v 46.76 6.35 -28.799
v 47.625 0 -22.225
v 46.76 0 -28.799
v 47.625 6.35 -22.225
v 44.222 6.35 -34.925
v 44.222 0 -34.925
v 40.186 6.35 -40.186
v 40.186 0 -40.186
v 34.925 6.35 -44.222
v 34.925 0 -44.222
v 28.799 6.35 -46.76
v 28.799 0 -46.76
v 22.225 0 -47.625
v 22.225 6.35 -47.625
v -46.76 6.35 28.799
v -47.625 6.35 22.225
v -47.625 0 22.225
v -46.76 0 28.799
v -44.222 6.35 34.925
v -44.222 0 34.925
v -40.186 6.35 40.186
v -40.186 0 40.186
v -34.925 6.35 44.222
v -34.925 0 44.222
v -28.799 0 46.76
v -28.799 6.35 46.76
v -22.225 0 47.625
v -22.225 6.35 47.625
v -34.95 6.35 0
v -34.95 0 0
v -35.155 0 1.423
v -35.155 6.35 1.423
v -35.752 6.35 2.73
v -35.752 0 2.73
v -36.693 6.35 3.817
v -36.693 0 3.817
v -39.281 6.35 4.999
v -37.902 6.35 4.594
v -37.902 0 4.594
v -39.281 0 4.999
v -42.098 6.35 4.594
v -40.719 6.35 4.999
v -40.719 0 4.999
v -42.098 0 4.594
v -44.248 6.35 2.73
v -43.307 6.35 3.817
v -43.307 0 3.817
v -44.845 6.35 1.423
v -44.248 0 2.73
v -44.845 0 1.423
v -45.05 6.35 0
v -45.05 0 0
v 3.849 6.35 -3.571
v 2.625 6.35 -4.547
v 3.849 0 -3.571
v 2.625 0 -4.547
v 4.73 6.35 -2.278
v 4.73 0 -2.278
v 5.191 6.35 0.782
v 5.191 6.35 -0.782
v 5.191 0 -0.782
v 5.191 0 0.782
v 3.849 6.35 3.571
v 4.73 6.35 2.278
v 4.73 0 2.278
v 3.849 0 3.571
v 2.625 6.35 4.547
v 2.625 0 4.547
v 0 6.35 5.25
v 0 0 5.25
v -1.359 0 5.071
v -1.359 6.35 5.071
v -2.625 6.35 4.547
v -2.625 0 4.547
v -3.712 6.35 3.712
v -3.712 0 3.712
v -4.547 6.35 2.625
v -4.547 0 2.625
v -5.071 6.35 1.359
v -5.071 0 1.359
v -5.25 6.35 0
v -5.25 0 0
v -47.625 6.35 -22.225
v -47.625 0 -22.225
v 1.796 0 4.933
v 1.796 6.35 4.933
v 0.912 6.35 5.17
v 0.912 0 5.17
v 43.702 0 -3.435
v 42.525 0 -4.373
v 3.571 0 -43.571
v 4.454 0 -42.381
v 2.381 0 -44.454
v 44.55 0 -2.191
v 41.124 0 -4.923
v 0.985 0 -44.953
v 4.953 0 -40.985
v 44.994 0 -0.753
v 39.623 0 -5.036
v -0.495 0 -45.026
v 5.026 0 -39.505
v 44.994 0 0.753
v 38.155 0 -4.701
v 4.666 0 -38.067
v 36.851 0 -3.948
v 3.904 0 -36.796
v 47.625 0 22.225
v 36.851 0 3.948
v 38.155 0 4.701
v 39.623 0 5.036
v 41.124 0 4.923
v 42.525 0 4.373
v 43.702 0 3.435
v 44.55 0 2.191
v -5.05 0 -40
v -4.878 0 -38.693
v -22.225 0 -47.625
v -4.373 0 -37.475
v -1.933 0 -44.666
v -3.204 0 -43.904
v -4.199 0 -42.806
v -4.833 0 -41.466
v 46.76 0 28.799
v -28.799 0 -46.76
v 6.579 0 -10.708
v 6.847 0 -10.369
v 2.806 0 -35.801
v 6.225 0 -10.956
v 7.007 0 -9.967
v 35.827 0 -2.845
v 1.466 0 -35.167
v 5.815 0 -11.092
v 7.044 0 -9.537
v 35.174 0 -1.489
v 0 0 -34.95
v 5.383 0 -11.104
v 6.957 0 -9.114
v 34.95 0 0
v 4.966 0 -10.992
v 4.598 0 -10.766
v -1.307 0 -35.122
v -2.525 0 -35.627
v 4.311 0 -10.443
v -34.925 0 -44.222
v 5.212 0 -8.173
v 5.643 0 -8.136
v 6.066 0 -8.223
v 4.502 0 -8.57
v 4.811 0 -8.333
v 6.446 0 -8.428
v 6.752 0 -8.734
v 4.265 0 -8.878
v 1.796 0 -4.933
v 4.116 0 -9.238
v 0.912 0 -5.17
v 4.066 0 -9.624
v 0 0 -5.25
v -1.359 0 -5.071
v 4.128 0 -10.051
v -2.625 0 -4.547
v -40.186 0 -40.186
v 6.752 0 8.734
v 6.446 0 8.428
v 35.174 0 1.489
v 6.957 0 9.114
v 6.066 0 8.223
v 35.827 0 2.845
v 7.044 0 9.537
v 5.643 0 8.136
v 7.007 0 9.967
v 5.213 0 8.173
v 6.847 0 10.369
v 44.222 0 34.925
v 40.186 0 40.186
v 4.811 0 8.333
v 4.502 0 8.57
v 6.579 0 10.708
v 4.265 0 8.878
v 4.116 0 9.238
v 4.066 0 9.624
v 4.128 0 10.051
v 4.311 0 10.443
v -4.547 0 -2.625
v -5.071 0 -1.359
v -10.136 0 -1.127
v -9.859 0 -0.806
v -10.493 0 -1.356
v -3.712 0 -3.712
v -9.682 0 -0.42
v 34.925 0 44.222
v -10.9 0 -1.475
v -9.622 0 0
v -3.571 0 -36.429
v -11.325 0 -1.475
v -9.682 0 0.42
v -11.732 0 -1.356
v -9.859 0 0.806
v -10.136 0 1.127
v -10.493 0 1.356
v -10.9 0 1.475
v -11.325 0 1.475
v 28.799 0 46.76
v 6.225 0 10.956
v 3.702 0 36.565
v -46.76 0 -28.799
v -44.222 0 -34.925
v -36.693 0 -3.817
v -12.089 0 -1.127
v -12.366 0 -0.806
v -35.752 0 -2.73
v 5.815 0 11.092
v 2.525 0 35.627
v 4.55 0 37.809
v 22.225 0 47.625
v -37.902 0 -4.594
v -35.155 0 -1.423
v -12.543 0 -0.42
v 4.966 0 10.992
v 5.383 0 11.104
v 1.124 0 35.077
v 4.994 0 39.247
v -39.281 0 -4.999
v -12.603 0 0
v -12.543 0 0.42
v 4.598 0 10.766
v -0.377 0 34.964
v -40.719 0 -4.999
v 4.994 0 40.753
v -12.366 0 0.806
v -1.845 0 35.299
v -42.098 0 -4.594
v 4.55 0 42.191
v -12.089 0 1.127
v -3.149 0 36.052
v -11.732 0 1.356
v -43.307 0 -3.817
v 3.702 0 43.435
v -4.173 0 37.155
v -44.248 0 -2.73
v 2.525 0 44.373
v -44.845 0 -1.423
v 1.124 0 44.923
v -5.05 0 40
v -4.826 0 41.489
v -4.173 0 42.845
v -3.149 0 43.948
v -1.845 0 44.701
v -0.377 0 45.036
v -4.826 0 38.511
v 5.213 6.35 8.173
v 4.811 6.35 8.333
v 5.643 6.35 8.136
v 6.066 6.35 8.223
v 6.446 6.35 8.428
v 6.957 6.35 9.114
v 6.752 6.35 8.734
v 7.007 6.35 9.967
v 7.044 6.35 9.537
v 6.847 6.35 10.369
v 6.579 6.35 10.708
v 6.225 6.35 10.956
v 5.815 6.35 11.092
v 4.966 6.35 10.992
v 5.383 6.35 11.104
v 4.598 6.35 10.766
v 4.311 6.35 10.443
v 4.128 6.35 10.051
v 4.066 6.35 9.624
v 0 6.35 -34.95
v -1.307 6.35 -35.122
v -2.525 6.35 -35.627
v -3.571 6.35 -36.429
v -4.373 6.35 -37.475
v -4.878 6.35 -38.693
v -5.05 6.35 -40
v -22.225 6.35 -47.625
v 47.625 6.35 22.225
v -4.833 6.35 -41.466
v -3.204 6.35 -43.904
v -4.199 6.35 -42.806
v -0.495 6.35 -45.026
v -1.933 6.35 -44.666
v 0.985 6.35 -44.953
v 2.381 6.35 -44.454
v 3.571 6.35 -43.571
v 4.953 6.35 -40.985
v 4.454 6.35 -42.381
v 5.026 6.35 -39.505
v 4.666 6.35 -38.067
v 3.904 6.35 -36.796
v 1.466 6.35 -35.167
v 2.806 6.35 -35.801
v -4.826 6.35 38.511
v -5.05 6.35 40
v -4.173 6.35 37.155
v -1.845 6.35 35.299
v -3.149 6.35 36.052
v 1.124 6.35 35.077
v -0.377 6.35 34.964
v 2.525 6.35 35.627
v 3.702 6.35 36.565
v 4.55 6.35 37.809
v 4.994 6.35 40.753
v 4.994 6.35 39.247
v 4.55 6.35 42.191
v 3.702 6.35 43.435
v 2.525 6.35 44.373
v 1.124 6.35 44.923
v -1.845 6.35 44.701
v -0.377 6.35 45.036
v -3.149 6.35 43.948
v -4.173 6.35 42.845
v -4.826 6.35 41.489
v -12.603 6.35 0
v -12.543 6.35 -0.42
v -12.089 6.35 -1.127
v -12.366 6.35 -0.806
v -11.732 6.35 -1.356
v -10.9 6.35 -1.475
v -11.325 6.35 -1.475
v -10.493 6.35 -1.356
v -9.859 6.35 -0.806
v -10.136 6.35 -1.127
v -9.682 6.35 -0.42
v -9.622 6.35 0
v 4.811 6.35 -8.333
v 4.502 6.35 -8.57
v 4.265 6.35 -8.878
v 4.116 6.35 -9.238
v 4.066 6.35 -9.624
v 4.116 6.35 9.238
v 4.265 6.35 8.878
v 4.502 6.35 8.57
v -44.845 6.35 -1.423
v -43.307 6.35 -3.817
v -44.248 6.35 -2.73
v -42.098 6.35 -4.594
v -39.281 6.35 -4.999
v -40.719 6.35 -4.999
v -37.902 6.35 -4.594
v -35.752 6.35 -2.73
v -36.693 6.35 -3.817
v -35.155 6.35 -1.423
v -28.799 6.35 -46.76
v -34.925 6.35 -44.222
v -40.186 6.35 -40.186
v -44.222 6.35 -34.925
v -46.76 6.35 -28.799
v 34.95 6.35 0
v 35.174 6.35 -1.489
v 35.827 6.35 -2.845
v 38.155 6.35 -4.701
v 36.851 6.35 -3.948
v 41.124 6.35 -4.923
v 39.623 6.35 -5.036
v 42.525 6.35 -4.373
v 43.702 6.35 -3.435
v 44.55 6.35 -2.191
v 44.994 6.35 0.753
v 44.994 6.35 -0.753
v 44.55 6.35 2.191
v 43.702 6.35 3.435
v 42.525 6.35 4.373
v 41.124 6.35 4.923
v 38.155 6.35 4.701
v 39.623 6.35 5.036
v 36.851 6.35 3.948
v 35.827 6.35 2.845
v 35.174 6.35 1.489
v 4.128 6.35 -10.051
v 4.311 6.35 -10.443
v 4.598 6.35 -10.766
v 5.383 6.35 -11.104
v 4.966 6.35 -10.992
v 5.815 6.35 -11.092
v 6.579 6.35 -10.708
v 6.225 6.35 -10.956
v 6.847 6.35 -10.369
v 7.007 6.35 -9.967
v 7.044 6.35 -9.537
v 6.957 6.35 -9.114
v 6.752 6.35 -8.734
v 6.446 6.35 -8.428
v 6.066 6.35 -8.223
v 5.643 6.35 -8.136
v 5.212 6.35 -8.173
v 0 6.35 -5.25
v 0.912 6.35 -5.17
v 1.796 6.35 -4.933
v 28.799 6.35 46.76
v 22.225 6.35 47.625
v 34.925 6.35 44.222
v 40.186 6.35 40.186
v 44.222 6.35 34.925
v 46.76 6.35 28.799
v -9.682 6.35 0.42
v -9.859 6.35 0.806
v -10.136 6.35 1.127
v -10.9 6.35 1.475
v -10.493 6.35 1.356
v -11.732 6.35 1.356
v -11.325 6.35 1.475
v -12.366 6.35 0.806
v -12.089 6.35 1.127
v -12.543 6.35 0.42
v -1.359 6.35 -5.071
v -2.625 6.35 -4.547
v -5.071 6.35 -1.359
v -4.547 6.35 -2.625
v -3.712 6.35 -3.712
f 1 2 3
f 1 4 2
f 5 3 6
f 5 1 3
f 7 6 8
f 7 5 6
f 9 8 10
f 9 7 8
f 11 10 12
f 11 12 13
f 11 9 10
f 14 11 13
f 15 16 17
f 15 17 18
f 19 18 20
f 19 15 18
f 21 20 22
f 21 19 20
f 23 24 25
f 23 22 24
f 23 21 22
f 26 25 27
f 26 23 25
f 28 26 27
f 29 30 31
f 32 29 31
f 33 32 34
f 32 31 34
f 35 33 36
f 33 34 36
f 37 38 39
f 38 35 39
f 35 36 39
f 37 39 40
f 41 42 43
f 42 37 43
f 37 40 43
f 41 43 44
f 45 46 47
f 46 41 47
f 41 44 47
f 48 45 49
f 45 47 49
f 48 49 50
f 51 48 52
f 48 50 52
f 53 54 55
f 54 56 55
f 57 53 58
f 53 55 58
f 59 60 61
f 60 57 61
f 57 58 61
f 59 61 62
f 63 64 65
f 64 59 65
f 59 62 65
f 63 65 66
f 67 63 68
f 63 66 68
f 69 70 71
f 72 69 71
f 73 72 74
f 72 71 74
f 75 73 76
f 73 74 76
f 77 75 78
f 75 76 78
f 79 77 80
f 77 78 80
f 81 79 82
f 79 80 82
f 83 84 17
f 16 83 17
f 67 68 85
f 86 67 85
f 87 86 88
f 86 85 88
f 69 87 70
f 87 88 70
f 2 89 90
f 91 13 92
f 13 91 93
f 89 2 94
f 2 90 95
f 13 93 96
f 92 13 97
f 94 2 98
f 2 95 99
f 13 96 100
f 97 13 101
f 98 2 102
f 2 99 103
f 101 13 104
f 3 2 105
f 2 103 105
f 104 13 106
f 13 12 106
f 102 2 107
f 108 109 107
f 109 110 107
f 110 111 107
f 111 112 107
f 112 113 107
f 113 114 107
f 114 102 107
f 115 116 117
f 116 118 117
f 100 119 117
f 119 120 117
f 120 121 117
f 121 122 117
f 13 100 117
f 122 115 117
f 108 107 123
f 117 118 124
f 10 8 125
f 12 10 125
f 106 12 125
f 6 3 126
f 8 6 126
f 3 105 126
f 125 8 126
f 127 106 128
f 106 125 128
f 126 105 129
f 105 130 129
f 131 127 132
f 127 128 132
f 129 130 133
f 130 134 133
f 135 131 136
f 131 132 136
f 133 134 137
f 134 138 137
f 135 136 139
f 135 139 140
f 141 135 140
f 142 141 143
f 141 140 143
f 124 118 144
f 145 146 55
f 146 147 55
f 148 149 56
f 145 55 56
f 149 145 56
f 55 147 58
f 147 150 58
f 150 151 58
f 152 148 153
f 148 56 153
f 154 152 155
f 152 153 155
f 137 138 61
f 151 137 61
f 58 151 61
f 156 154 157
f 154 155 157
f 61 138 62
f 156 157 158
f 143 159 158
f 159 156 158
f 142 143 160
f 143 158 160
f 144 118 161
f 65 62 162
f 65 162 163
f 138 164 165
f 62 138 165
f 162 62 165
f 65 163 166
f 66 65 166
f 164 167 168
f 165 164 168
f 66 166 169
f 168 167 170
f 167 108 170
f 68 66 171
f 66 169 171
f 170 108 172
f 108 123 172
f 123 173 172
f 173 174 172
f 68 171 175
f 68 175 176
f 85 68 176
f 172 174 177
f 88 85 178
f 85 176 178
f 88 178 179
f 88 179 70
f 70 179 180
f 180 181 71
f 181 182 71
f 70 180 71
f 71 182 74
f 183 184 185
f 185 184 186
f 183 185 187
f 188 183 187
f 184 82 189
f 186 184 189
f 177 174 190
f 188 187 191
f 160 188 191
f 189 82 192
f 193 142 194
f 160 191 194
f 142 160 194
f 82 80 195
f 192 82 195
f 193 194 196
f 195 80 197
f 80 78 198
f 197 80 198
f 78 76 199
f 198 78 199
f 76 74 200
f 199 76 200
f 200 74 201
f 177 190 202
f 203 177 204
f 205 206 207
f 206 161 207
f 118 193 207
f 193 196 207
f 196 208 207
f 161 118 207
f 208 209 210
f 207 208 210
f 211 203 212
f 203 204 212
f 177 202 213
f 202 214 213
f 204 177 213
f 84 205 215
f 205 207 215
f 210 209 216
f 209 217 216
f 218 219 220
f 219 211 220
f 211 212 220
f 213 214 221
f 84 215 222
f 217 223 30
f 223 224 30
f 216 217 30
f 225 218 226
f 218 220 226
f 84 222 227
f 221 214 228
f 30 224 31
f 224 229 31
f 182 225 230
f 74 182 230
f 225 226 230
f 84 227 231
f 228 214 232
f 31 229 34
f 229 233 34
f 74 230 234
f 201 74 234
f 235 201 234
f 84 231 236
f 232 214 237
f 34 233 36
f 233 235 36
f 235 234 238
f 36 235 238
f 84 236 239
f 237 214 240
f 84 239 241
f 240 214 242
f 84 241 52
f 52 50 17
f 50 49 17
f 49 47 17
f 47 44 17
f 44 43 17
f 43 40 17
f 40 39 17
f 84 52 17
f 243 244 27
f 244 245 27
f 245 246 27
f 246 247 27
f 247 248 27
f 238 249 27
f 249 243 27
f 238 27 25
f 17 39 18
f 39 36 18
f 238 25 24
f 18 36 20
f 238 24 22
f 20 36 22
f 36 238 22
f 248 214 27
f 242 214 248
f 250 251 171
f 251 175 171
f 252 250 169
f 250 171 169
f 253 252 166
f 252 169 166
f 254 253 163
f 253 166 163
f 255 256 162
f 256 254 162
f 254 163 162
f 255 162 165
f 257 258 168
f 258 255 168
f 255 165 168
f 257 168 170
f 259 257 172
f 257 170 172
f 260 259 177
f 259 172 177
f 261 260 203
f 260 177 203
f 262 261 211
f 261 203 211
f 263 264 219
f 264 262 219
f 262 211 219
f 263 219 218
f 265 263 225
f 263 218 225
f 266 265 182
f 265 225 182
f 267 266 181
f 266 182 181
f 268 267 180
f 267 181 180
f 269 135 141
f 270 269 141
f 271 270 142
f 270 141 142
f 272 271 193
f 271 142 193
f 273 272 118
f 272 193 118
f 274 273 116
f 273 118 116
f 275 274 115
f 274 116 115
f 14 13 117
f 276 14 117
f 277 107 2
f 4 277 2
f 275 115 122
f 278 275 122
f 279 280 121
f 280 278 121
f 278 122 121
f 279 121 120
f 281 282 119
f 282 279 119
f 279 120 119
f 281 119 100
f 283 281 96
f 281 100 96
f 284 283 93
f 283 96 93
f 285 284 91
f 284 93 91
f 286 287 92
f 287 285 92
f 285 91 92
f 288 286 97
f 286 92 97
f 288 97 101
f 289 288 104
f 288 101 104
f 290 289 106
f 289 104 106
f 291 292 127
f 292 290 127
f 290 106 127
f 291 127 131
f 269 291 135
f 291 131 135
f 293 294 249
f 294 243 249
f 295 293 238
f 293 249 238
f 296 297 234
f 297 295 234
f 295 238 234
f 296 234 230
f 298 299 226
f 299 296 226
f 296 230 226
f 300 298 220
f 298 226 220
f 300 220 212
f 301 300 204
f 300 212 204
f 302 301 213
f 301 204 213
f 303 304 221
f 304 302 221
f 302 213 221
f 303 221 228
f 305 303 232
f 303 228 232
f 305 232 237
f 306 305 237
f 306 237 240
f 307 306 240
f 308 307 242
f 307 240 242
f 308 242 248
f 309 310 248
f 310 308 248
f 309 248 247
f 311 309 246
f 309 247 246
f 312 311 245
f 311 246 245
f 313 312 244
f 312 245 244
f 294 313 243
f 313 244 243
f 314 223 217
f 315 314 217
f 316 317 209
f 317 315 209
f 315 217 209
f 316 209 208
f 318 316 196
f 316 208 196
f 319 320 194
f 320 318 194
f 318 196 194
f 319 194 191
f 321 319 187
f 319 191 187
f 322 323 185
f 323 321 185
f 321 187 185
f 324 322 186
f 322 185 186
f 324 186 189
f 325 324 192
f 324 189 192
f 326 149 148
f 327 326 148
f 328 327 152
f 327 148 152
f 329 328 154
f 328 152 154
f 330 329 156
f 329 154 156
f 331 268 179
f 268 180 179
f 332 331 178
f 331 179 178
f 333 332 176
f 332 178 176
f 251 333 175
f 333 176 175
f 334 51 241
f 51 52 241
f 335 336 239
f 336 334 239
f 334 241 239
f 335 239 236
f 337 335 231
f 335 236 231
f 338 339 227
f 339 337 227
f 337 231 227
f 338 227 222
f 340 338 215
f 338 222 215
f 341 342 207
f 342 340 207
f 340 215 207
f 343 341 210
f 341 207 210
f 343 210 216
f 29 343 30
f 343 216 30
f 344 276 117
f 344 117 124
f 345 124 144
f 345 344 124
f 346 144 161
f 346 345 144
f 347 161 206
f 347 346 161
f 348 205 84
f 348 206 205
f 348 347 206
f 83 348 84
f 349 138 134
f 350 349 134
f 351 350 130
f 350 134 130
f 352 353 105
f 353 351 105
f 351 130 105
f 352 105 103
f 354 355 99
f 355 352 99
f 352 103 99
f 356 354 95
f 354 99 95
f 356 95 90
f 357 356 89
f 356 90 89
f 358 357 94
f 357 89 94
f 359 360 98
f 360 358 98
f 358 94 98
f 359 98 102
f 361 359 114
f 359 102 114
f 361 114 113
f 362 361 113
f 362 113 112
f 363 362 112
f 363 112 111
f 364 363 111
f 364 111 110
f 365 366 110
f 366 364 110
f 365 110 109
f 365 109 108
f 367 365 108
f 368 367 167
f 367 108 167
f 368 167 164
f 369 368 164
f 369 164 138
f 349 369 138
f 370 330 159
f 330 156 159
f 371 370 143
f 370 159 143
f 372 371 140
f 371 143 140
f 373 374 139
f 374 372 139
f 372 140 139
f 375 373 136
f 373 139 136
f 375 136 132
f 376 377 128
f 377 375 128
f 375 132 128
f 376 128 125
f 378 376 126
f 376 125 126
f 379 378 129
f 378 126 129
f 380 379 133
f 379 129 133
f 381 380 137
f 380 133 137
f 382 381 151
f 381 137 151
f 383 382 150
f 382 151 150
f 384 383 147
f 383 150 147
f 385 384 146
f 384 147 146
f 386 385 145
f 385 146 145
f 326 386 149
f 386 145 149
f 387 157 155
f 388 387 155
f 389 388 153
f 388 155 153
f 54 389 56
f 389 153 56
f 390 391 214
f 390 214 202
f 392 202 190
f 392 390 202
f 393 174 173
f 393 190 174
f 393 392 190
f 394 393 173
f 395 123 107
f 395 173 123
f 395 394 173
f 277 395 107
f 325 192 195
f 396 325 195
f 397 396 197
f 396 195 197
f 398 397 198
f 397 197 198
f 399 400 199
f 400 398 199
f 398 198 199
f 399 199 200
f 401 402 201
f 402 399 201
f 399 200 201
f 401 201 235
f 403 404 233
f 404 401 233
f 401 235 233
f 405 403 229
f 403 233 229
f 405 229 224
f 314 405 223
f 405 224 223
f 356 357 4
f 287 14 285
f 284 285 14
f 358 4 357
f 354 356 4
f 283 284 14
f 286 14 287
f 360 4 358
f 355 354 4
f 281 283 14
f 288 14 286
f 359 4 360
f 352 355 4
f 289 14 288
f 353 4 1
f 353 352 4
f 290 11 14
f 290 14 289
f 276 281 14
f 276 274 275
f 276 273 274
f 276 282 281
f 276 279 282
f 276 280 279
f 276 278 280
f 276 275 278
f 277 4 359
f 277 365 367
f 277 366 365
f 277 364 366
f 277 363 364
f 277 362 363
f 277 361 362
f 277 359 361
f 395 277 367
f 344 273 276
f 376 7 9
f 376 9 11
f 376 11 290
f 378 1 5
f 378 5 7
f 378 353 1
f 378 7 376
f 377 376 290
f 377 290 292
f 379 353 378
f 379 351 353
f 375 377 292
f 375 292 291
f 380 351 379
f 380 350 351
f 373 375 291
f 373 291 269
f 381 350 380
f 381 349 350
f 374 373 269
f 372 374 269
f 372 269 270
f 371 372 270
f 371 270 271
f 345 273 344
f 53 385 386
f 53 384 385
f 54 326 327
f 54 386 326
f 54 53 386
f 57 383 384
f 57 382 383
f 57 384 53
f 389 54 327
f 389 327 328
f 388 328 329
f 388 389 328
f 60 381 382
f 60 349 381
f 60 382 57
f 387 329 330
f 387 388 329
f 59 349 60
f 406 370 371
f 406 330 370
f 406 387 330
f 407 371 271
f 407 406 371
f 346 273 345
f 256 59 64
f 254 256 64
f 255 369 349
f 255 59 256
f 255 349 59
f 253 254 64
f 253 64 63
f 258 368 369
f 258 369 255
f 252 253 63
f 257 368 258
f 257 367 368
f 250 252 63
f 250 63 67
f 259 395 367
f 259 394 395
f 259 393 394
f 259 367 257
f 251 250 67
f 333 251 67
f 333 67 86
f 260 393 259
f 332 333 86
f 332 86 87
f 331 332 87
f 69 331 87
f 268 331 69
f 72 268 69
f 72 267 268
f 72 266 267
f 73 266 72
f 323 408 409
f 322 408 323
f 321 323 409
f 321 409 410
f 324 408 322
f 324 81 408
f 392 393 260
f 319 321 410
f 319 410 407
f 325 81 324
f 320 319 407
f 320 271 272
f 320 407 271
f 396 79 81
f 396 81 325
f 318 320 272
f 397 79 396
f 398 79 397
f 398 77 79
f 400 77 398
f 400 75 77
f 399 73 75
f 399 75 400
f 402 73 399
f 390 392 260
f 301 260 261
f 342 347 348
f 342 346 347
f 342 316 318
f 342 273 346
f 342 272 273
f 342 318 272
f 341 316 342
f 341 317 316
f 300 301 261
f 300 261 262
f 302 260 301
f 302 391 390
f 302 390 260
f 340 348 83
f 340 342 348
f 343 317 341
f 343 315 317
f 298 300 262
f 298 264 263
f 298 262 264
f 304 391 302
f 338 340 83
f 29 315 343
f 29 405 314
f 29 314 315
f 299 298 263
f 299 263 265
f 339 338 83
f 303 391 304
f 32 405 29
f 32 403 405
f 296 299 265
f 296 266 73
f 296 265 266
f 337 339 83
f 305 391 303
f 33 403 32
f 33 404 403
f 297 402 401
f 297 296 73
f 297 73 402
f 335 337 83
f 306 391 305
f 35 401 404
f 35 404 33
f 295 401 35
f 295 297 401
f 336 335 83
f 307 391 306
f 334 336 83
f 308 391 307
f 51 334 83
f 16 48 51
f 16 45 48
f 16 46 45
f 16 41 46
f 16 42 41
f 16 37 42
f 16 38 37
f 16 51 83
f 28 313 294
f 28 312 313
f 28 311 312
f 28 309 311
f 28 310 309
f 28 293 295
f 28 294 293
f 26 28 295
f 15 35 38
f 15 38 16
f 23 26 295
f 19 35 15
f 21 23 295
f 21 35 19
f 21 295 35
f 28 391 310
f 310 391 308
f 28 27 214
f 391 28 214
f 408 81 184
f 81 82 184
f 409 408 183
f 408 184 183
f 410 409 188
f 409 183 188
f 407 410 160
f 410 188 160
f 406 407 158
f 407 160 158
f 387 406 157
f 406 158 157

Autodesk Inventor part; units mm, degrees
ref_plane "YZ Plane" through (0, 0, 0) normal (1, 0, 0) x (0, 1, 0)
ref_plane "XZ Plane" through (0, 0, 0) normal (0, 1, 0) x (-1, 0, 0)
ref_plane "XY Plane" through (0, 0, 0) normal (0, 0, 1) x (1, 0, 0)
sketch "Sketch3" plane through (0, 0, 0) normal (0, 1, 0) x (-1, 0, 0)
  circle A0 centre (11.1125, 0) radius 1.4906
  circle A1 centre (-5.5563, 9.6237) radius 1.4906
  circle A2 centre (-5.5562, -9.6237) radius 1.4906
  circle A3 centre (0, 0) radius 5.25
  line L0 (0, 0) -> (11.1125, 0)
  line L1 (0, 0) -> (-5.5563, 9.6237)
  line L2 (0, 0) -> (-5.5562, -9.6237)
  line L3 (0, 11.7306) -> (0, -34.9786)
  line L4 (38.6398, 0) -> (-3.2951, 0)
  circle A4 centre (40, 0) radius 5.05
  circle A5 centre (0, -40) radius 5.05
  circle A6 centre (0, 40) radius 5.05
  circle A7 centre (-40, 0) radius 5.05
  line L5 (-47.625, -47.625) -> (47.625, -47.625)
  line L6 (47.625, -47.625) -> (47.625, 47.625)
  line L7 (47.625, 47.625) -> (-47.625, 47.625)
  line L8 (-47.625, 47.625) -> (-47.625, -47.625)
  line L9 (-47.625, -47.625) -> (47.625, 47.625) construction
  line L10 (47.625, -47.625) -> (-47.625, 47.625) construction
  dimension "d19" = 120
  dimension "d20" = 120
  dimension "d21" = 11.1125
  dimension "d22" = 11.1125
  dimension "d23" = 11.1125
  dimension "d24" = 2.9811
  dimension "d25" = 2.9811
  dimension "d26" = 2.9811
  dimension "d27" = 80
  dimension "d28" = 80
  dimension "d29" = 10.1
  dimension "d30" = 10.1
  dimension "d31" = 95.25
  dimension "d32" = 95.25
  dimension "d36" = 10.5
extrude "Extrusion6" add sketch "Sketch3" along normal blind 6.35
fillet "Fillet1" radius 25.4 4 edges at (-47.625, 3.175, 47.625) (47.625, 3.175, 47.625) (47.625, 3.175, -47.625) (-47.625, 3.175, -47.625)
equation "\"d22\" = d21"
equation "\"d23\" = d21"
equation "\"d25\" = d24"
equation "\"d26\" = d24"
equation "\"d28\" = d27"
equation "\"d30\" = d29"
equation "\"d32\" = d31"
properties part number "Vertical_Lead_Screw_Plate"
